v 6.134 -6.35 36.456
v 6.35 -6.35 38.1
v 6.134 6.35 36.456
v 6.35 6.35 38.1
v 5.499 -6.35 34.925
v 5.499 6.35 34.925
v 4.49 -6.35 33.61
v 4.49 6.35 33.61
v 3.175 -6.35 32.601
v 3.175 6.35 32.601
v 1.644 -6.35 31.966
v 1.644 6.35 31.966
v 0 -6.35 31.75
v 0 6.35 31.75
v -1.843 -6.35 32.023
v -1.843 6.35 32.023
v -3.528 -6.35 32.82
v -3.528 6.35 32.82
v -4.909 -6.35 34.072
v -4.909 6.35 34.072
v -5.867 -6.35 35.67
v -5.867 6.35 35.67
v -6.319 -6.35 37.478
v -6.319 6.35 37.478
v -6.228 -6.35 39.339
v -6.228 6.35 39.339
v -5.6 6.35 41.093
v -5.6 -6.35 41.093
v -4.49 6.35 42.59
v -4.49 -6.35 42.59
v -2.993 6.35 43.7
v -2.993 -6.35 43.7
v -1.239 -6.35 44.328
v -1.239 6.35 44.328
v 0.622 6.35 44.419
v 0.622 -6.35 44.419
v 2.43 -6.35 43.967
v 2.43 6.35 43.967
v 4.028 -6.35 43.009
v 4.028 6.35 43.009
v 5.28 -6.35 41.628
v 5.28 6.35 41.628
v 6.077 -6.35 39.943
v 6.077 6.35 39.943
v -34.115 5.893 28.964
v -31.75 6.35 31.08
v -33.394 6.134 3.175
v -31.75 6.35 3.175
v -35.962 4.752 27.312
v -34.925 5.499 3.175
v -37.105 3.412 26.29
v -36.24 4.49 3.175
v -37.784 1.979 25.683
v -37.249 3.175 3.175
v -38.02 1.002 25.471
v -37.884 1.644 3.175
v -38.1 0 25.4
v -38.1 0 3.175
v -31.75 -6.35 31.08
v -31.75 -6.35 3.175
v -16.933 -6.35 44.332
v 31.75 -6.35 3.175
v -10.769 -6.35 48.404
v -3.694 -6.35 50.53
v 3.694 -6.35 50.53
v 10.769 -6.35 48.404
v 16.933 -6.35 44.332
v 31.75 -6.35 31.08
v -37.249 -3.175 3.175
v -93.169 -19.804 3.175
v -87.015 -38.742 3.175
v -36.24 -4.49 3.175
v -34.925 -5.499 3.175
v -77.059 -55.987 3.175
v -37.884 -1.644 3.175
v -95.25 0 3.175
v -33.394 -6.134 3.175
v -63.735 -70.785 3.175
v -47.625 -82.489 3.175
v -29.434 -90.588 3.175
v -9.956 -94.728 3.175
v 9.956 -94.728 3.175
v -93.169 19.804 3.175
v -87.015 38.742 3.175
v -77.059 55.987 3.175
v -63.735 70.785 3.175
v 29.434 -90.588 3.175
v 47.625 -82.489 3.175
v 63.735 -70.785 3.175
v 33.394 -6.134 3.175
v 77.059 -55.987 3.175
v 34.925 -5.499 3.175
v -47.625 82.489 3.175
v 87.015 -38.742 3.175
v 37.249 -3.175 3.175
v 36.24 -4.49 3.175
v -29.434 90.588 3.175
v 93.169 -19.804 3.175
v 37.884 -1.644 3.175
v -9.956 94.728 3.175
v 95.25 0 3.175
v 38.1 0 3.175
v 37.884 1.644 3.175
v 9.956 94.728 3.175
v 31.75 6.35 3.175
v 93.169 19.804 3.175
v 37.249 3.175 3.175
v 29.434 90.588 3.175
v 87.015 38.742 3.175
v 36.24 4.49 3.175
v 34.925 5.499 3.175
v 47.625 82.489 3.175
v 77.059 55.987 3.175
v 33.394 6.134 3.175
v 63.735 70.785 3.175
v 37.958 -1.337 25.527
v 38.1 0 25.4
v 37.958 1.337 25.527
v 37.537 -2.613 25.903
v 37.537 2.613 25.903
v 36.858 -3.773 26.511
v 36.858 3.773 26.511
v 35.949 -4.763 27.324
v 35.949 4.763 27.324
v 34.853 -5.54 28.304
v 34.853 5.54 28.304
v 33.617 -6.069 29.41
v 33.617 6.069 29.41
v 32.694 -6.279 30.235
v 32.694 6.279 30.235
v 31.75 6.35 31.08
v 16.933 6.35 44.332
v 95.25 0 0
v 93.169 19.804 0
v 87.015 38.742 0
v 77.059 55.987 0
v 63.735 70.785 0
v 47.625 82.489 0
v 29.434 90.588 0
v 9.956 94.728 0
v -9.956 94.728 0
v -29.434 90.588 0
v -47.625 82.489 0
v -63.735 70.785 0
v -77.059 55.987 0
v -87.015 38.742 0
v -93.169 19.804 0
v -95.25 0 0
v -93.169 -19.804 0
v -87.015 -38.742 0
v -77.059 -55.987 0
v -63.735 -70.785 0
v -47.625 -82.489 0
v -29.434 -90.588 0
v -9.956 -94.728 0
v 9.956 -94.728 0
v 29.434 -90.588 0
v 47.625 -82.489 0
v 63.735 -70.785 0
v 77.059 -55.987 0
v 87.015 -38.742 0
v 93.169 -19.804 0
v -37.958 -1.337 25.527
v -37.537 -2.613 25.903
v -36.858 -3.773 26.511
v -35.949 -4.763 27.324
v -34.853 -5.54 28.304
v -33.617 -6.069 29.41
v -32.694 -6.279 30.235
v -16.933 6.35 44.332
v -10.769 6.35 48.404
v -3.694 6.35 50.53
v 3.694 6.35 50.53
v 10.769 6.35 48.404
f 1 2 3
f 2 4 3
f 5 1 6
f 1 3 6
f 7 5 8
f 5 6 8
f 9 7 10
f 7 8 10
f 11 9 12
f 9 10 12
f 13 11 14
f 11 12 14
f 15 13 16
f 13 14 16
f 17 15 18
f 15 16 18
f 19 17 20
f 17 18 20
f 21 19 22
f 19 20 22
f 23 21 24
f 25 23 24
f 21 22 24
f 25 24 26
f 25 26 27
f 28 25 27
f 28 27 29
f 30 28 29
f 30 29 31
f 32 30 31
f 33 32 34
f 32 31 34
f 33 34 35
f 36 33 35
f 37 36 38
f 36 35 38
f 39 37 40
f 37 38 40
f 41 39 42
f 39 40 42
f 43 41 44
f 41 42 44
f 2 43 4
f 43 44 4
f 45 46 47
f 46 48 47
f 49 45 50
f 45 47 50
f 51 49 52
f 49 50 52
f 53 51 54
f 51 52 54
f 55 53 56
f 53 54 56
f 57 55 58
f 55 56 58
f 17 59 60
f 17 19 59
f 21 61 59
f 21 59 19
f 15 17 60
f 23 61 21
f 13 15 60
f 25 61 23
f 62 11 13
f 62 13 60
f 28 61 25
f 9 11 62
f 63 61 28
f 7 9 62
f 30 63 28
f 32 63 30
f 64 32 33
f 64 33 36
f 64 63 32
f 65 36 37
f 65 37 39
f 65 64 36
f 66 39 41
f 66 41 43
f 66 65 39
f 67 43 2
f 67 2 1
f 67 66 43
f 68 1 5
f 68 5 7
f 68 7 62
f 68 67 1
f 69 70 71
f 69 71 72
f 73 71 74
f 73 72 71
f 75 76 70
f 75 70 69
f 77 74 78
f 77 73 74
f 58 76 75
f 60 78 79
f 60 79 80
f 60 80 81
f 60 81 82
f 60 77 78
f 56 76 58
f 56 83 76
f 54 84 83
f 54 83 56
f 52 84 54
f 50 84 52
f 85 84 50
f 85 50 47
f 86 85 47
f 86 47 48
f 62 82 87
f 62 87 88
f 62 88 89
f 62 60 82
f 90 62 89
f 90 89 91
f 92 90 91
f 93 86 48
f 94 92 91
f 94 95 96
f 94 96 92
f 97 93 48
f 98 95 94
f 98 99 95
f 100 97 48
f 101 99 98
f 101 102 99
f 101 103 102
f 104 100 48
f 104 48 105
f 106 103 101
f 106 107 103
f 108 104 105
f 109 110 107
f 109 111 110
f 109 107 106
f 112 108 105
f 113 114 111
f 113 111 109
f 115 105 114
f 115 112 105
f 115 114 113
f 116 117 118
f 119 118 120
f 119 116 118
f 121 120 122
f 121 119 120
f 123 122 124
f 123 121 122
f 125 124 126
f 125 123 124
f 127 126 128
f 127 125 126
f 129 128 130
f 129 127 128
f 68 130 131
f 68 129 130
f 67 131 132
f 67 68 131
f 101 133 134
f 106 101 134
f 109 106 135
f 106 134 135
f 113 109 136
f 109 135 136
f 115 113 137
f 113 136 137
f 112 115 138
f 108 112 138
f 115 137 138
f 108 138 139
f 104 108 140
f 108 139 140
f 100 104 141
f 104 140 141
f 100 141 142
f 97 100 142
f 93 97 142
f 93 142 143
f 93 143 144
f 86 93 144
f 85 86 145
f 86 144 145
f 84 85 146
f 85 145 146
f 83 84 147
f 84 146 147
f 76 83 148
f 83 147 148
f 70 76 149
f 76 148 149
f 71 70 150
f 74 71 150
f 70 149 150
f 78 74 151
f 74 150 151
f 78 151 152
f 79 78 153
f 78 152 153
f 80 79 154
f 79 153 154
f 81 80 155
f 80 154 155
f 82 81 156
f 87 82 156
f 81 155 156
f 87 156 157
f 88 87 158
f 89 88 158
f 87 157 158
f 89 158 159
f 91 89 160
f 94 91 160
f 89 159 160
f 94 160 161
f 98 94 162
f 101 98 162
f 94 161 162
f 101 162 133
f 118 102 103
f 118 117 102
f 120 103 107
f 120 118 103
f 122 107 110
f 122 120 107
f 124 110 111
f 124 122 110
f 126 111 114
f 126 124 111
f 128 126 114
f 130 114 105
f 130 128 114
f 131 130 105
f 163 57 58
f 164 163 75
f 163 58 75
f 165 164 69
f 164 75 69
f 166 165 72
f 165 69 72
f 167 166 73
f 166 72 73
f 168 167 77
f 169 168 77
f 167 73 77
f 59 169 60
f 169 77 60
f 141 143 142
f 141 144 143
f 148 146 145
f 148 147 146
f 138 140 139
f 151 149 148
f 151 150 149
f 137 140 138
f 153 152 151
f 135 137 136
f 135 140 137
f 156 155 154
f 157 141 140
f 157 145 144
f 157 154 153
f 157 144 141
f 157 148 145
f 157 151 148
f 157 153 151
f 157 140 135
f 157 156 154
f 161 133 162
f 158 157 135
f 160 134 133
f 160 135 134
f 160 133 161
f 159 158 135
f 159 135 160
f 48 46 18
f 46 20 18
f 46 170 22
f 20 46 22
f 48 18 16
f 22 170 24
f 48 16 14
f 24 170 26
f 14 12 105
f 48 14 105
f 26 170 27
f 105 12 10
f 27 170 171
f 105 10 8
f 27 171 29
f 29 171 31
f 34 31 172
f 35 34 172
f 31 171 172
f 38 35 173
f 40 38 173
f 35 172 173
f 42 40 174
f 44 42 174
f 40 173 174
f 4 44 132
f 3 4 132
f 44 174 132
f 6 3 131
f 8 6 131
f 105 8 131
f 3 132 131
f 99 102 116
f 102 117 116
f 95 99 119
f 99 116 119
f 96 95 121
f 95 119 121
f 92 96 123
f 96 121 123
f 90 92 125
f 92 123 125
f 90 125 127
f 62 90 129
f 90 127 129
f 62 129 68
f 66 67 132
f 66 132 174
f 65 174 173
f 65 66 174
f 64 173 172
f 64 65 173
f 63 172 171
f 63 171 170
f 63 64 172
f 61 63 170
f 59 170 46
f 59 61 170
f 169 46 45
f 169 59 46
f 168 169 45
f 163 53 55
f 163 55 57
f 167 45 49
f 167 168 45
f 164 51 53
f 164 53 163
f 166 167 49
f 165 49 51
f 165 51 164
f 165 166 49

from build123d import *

# Parameters (mm, degrees)
F0_R     = 95.25
F1_DEPTH = 3.175
F3_DEPTH = 6.35
F4_R     = 6.34999


# Not quite as in the source:
# - a fillet or chamfer is up to 0.001 mm smaller than in the source, because OpenCascade refuses the exact size


with BuildPart() as f1:
    # F0 (on Top) → F1 (new body)
    with BuildSketch(Plane.XY):
        Circle(F0_R)
    extrude(amount=F1_DEPTH)

    # F2 (on Front) → F3 (join, symmetric)
    with BuildSketch(Plane.XZ):
        with BuildLine():
            Line((38.1, 0), (38.1, 25.4))
            Line((38.1, 25.4), (16.9333333333, 44.3320422095))
            ThreePointArc((16.9333333333, 44.3320422095), (0, 50.8), (-16.9333333333, 44.3320422095))
            Line((-16.9333333333, 44.3320422095), (-38.1, 25.4))
            Line((-38.1, 25.4), (-38.1, 0))
            Line((-38.1, 0), (0, 0))
            Line((0, 0), (38.1, 0))
        make_face()
        with BuildLine():
            ThreePointArc((6.35, 38.1), (4.4901280605, 33.6098719395), (0, 31.75))
            ThreePointArc((0, 31.75), (-4.4901280605, 42.5901280605), (6.35, 38.1))
        make_face(mode=Mode.SUBTRACT)
    extrude(amount=F3_DEPTH, both=True)

    # F4 (radius 6.35 in the source; OpenCascade refuses exactly that, so slightly less here)
    f4_edges = [f1.edges().sort_by_distance(p)[0] for p in [
        (-38.1, -6.35, 14.2875),
        (-38.1, 6.35, 14.2875),
        (38.1, -6.35, 14.2875),
        (38.1, 6.35, 14.2875),
    ]]
    fillet(f4_edges, radius=F4_R)


solid = f1.part
